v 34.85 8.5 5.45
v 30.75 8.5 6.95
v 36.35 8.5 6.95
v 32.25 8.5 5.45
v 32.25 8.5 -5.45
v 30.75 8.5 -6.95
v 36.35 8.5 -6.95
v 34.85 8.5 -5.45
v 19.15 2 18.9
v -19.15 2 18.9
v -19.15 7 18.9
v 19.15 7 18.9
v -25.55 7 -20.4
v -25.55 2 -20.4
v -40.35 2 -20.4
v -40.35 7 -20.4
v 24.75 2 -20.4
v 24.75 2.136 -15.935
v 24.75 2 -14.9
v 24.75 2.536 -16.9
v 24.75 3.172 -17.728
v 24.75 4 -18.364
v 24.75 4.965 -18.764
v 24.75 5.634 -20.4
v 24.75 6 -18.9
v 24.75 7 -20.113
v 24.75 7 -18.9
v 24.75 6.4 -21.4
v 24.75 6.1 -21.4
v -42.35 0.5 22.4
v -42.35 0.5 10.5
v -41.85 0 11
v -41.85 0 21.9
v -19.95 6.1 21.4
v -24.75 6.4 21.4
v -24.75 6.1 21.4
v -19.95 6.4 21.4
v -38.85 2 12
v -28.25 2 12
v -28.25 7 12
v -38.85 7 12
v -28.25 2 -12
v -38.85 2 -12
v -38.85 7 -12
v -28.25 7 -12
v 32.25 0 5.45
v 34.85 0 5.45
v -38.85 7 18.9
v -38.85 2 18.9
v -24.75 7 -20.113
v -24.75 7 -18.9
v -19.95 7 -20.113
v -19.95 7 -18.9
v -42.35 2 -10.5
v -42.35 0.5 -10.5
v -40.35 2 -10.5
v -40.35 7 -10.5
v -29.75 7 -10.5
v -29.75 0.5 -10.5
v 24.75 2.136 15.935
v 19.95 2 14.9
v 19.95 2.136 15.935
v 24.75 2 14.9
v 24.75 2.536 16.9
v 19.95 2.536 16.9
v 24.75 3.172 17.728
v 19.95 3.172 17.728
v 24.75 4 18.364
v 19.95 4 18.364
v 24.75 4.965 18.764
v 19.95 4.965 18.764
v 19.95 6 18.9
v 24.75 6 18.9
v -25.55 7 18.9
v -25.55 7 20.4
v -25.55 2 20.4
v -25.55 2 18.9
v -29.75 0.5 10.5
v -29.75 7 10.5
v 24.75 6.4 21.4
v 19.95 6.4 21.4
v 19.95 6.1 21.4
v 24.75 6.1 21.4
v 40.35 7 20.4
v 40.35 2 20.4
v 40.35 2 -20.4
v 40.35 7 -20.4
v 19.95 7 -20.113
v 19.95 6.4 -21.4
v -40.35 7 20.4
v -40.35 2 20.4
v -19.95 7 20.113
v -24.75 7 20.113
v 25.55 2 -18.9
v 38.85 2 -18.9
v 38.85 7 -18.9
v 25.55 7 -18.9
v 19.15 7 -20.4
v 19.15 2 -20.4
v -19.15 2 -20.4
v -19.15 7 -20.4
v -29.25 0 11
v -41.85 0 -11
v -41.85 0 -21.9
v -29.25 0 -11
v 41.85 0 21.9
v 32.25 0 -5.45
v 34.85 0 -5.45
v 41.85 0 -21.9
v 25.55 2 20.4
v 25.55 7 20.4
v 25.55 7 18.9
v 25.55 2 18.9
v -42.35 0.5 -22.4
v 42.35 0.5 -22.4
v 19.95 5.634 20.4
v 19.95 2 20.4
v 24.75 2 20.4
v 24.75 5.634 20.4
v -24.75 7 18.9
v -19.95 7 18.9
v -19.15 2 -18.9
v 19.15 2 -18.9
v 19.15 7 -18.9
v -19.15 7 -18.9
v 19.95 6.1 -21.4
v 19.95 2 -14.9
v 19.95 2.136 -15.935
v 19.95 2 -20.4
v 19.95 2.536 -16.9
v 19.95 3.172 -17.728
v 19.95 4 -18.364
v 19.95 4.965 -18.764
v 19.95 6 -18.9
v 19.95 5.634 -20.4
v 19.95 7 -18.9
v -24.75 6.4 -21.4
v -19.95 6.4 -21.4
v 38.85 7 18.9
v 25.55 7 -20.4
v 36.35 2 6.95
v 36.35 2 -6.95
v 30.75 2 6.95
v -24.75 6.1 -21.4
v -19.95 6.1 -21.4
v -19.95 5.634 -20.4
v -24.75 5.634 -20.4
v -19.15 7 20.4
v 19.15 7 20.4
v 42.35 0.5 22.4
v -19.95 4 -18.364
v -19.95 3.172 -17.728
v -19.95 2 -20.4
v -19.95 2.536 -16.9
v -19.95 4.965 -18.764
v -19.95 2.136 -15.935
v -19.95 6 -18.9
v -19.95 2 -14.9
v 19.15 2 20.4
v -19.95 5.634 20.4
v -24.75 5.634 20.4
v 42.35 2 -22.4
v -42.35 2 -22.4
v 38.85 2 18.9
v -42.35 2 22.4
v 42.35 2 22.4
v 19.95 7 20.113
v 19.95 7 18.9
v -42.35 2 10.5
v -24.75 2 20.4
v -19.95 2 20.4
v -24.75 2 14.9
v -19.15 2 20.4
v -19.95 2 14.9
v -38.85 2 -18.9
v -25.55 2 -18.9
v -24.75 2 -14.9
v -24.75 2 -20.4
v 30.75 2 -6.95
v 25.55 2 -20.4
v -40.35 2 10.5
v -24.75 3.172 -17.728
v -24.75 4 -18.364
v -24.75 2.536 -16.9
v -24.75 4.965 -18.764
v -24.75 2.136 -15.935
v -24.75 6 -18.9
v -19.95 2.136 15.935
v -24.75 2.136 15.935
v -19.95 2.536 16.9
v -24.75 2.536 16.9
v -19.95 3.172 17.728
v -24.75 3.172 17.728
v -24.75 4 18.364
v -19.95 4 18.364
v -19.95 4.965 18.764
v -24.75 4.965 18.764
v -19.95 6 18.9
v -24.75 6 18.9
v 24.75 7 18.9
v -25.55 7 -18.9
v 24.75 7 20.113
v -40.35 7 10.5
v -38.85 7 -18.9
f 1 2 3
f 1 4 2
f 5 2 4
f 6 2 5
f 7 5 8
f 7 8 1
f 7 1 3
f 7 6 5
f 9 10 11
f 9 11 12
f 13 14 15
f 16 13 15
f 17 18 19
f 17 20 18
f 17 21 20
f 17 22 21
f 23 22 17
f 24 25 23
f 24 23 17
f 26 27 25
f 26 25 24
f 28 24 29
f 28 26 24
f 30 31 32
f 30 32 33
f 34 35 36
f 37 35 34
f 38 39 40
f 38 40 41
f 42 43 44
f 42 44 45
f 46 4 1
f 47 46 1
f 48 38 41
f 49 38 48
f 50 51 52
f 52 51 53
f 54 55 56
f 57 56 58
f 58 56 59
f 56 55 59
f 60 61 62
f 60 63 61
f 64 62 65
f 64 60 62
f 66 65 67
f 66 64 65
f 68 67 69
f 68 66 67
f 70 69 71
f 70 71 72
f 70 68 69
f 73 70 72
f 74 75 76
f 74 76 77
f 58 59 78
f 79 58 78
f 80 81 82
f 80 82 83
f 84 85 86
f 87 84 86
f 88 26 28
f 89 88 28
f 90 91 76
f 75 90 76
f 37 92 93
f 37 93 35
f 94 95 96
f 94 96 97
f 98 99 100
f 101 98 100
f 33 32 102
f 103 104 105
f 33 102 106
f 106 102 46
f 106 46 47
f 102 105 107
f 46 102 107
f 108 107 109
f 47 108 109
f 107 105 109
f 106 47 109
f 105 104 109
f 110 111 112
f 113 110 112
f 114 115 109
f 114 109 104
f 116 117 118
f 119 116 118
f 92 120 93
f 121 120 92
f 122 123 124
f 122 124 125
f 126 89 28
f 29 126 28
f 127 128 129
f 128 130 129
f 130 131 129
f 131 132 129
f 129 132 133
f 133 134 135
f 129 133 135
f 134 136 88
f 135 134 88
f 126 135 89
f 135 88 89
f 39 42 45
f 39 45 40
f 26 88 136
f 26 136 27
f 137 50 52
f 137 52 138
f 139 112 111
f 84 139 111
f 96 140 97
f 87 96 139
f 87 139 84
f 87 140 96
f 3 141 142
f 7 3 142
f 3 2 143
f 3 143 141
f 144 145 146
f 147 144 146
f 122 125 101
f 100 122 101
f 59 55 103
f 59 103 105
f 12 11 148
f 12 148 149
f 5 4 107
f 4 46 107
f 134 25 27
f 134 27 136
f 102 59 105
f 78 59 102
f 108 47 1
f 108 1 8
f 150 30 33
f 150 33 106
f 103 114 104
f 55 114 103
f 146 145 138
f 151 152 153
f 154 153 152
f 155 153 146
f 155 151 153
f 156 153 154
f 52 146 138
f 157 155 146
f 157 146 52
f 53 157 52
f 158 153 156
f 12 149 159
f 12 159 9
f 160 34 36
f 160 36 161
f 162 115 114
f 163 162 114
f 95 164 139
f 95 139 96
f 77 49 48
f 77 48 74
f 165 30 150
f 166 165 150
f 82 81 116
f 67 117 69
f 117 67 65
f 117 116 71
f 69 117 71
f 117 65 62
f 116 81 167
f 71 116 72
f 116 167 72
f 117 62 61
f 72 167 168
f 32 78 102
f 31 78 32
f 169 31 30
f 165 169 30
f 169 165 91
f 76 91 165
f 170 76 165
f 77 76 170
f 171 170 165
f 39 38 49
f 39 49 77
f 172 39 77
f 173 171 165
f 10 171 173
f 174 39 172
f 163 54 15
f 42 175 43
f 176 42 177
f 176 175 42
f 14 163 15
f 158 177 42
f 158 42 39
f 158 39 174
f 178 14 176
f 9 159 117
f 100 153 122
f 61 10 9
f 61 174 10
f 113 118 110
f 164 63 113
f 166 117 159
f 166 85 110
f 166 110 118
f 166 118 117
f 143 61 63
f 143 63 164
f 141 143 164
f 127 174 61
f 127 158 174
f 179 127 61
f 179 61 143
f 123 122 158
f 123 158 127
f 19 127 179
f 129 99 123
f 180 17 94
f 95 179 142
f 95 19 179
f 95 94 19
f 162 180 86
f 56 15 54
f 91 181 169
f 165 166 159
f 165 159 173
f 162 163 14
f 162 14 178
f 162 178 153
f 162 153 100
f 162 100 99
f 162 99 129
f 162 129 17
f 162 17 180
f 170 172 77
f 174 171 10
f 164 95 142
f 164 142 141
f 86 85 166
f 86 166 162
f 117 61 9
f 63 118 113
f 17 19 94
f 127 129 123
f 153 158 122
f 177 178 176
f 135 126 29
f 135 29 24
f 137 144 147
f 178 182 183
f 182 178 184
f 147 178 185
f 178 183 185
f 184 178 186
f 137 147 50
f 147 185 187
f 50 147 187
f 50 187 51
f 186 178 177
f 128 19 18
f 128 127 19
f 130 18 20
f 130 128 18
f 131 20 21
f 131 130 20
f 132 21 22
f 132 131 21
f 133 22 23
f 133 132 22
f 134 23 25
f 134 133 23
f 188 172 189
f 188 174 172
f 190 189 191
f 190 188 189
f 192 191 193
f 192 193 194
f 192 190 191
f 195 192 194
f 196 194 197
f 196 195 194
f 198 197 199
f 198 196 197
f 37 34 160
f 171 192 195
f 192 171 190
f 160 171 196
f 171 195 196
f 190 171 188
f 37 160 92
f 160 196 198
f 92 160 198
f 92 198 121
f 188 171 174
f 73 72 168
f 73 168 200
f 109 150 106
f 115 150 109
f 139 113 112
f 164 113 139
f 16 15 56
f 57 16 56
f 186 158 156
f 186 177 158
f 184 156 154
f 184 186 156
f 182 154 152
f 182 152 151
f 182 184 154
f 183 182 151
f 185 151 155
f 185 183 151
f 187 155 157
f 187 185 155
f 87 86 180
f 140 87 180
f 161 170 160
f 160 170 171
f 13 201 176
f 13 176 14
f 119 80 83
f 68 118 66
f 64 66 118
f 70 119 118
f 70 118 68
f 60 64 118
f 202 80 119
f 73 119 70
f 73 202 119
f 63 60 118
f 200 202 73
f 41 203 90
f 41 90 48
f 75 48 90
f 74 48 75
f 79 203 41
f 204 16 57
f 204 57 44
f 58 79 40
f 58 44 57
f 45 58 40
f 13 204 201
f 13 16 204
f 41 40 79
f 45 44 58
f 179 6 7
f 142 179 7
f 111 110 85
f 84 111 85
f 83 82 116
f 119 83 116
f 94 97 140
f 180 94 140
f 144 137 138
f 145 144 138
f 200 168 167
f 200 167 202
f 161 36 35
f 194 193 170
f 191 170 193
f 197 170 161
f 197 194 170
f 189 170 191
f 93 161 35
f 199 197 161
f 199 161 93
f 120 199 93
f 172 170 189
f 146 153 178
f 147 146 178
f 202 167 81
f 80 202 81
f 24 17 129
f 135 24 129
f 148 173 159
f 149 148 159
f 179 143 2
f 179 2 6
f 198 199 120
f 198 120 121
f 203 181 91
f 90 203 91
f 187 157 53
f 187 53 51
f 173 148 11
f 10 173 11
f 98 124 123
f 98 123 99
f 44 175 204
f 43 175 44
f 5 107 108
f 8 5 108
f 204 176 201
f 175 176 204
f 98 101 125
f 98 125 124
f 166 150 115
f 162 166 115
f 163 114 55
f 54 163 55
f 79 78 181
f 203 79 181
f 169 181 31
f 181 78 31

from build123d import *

# Parameters (mm, degrees)
BOSS_EXTRUDE1_DEPTH = 2
BOSS_EXTRUDE2_DEPTH = 5
SKETCH3_W           = 0.8
SKETCH3_H           = 1.5
CUT_EXTRUDE1_DEPTH  = 5
SKETCH4_W           = 4.8
SKETCH4_H           = 1.5
BOSS_EXTRUDE3_DEPTH = 1
CHAMFER3_SIZE       = 0.6
CHAMFER3_SIZE_2     = 1.286704152
SKETCH6_W           = 2.6
SKETCH6_H           = 10.9
CUT_EXTRUDE2_DEPTH  = 49.169310769
SKETCH7_W           = 5.6
SKETCH7_H           = 13.9
SKETCH7_W_2         = 2.6
SKETCH7_H_2         = 10.9
BOSS_EXTRUDE4_DEPTH = 6.5
CHAMFER6_SIZE       = 0.5
FILLET1_R           = 4


with BuildPart() as part:
    # Sketch1 → Boss-Extrude1 (new body)
    with BuildSketch(Plane(origin=(0, 0, 0), x_dir=(1, 0, 0), z_dir=(0, 1, 0))):
        Polygon((-42.35, 10.5), (-29.75, 10.5), (-29.75, -10.5), (-42.35, -10.5), (-42.35, -22.4), (42.35, -22.4), (42.35, 22.4), (-42.35, 22.4), align=None)
    extrude(amount=BOSS_EXTRUDE1_DEPTH)

    # Sketch2 → Boss-Extrude2 (add)
    with BuildSketch(Plane(origin=(0, 2, 0), x_dir=(1, 0, 0), z_dir=(0, 1, 0))):
        Polygon((-40.35, 20.4), (-40.35, 10.5), (-29.75, 10.5), (-29.75, -10.5), (-40.35, -10.5), (-40.35, -20.4), (40.35, -20.4), (40.35, 20.4), align=None)
        Polygon((-38.85, -12), (-38.85, -18.9), (38.85, -18.9), (38.85, 18.9), (-38.85, 18.9), (-38.85, 12), (-28.25, 12), (-28.25, -12), align=None, mode=Mode.SUBTRACT)
    extrude(amount=BOSS_EXTRUDE2_DEPTH)

    # Sketch3 → Cut-Extrude1 (cut)
    with BuildSketch(Plane(origin=(0, 7, 0), x_dir=(1, 0, 0), z_dir=(0, 1, 0))):
        with Locations((-25.15, 19.65)):
            Rectangle(SKETCH3_W, SKETCH3_H)
        with Locations((-19.55, 19.65)):
            Rectangle(SKETCH3_W, SKETCH3_H)
        with Locations((-19.55, -19.65)):
            Rectangle(SKETCH3_W, SKETCH3_H)
        with Locations((-25.15, -19.65)):
            Rectangle(SKETCH3_W, SKETCH3_H)
        with Locations((19.55, 19.65)):
            Rectangle(SKETCH3_W, SKETCH3_H)
        with Locations((25.15, 19.65)):
            Rectangle(SKETCH3_W, SKETCH3_H)
        with Locations((25.15, -19.65)):
            Rectangle(SKETCH3_W, SKETCH3_H)
        with Locations((19.55, -19.65)):
            Rectangle(SKETCH3_W, SKETCH3_H)
    extrude(amount=-CUT_EXTRUDE1_DEPTH, mode=Mode.SUBTRACT)

    # Sketch4 → Boss-Extrude3 (add)
    with BuildSketch(Plane.XY.offset(20.4)):
        with Locations((-22.35, 6.25)):
            Rectangle(SKETCH4_W, SKETCH4_H)
        with Locations((22.35, 6.25)):
            Rectangle(SKETCH4_W, SKETCH4_H)
    boss_extrude3 = extrude(amount=BOSS_EXTRUDE3_DEPTH)

    # Mirror1: Boss-Extrude3 across plane
    add(boss_extrude3.mirror(Plane.XY))

    # Chamfer3
    # the kernel refuses this chamfer: 1.286704152, 0.6 mm, written as the material it takes off along each edge
    with BuildSketch(Plane(origin=(16.616181102, 5.5, -21.4), x_dir=(0, 0.9971975577536771, -0.07481330637060246), z_dir=(1, 0, 0))) as chamfer3_piece_1_section:
        Polygon((CHAMFER3_SIZE * 0.997197557754, CHAMFER3_SIZE * 0.0748133063706), (-CHAMFER3_SIZE_2 * 0.0748133063884, CHAMFER3_SIZE_2 * 0.997197557991), (0, 0), align=None)
    chamfer3_piece_1 = extrude(amount=11.467637795, mode=Mode.PRIVATE)
    chamfer3_piece_1 = split(chamfer3_piece_1, bisect_by=Plane(origin=(22.35, 5.708120407, -20.4), z_dir=(0, 0, -1)), keep=Keep.TOP, mode=Mode.PRIVATE)
    add(chamfer3_piece_1, mode=Mode.SUBTRACT)
    with BuildSketch(Plane(origin=(28.083818898, 7, -21.4), x_dir=(0, 0.016311164131109942, 0.9998669641130704), z_dir=(-1, 0, 0))) as chamfer3_piece_2_section:
        Polygon((CHAMFER3_SIZE_2 * 0.999866964351, -CHAMFER3_SIZE_2 * 0.016311164135), (-CHAMFER3_SIZE * 0.0163111641311, -CHAMFER3_SIZE * 0.999866964113), (0, 0), align=None)
    chamfer3_piece_2 = extrude(amount=8.133818898, mode=Mode.PRIVATE)
    chamfer3_piece_2 = split(chamfer3_piece_2, bisect_by=Plane(origin=(25.55, 6.955435886, -20.304431949), z_dir=(-1, 0, 0)), keep=Keep.TOP, mode=Mode.PRIVATE)
    add(chamfer3_piece_2, mode=Mode.SUBTRACT)
    with BuildSketch(Plane(origin=(-16.616181102, 5.5, -21.4), x_dir=(0, 0.9971975577536771, -0.07481330637060246), z_dir=(-1, 0, 0))) as chamfer3_piece_3_section:
        Polygon((CHAMFER3_SIZE * 0.997197557754, -CHAMFER3_SIZE * 0.0748133063706), (-CHAMFER3_SIZE_2 * 0.0748133063884, -CHAMFER3_SIZE_2 * 0.997197557991), (0, 0), align=None)
    chamfer3_piece_3 = extrude(amount=11.467637795, mode=Mode.PRIVATE)
    chamfer3_piece_3 = split(chamfer3_piece_3, bisect_by=Plane(origin=(-22.35, 5.708120407, -20.4), z_dir=(0, 0, -1)), keep=Keep.TOP, mode=Mode.PRIVATE)
    add(chamfer3_piece_3, mode=Mode.SUBTRACT)
    with BuildSketch(Plane(origin=(-24.75, 7, -21.4), x_dir=(0, 0.016311164131109942, 0.9998669641130704), z_dir=(1, 0, 0))) as chamfer3_piece_4_section:
        Polygon((CHAMFER3_SIZE_2 * 0.999866964351, CHAMFER3_SIZE_2 * 0.016311164135), (-CHAMFER3_SIZE * 0.0163111641311, CHAMFER3_SIZE * 0.999866964113), (0, 0), align=None)
    chamfer3_piece_4 = extrude(amount=8.133818898, mode=Mode.PRIVATE)
    chamfer3_piece_4 = split(chamfer3_piece_4, bisect_by=Plane(origin=(-19.15, 6.955435886, -20.304431949), z_dir=(-1, 0, 0)), keep=Keep.TOP, mode=Mode.PRIVATE)
    add(chamfer3_piece_4, mode=Mode.SUBTRACT)
    with BuildSketch(Plane(origin=(16.616181102, 5.5, 21.4), x_dir=(0, 0.9971975577536771, 0.07481330637060246), z_dir=(1, 0, 0))) as chamfer3_piece_5_section:
        Polygon((CHAMFER3_SIZE * 0.997197557754, -CHAMFER3_SIZE * 0.0748133063706), (-CHAMFER3_SIZE_2 * 0.0748133063884, -CHAMFER3_SIZE_2 * 0.997197557991), (0, 0), align=None)
    chamfer3_piece_5 = extrude(amount=11.467637795, mode=Mode.PRIVATE)
    chamfer3_piece_5 = split(chamfer3_piece_5, bisect_by=Plane(origin=(22.35, 5.708120407, 20.4), z_dir=(0, 0, 1)), keep=Keep.TOP, mode=Mode.PRIVATE)
    add(chamfer3_piece_5, mode=Mode.SUBTRACT)
    with BuildSketch(Plane(origin=(24.75, 7, 21.4), x_dir=(0, 0.016311164131109942, -0.9998669641130704), z_dir=(-1, 0, 0))) as chamfer3_piece_6_section:
        Polygon((CHAMFER3_SIZE_2 * 0.999866964351, CHAMFER3_SIZE_2 * 0.016311164135), (-CHAMFER3_SIZE * 0.0163111641311, CHAMFER3_SIZE * 0.999866964113), (0, 0), align=None)
    chamfer3_piece_6 = extrude(amount=8.133818898, mode=Mode.PRIVATE)
    chamfer3_piece_6 = split(chamfer3_piece_6, bisect_by=Plane(origin=(19.15, 6.955435886, 20.304431949), z_dir=(1, 0, 0)), keep=Keep.TOP, mode=Mode.PRIVATE)
    add(chamfer3_piece_6, mode=Mode.SUBTRACT)
    with BuildSketch(Plane(origin=(-24.75, 7, 21.4), x_dir=(0, 0.016311164131109942, -0.9998669641130704), z_dir=(1, 0, 0))) as chamfer3_piece_7:
        Polygon((CHAMFER3_SIZE_2 * 0.999866964351, -CHAMFER3_SIZE_2 * 0.016311164135), (-CHAMFER3_SIZE * 0.0163111641311, -CHAMFER3_SIZE * 0.999866964113), (0, 0), align=None)
    extrude(amount=4.8, mode=Mode.SUBTRACT)
    with BuildSketch(Plane(origin=(-16.616181102, 5.5, 21.4), x_dir=(0, 0.9971975577536771, 0.07481330637060246), z_dir=(-1, 0, 0))) as chamfer3_piece_8_section:
        Polygon((CHAMFER3_SIZE * 0.997197557754, CHAMFER3_SIZE * 0.0748133063706), (-CHAMFER3_SIZE_2 * 0.0748133063884, CHAMFER3_SIZE_2 * 0.997197557991), (0, 0), align=None)
    chamfer3_piece_8 = extrude(amount=11.467637795, mode=Mode.PRIVATE)
    chamfer3_piece_8 = split(chamfer3_piece_8, bisect_by=Plane(origin=(-22.35, 5.708120407, 20.4), z_dir=(0, 0, 1)), keep=Keep.TOP, mode=Mode.PRIVATE)
    add(chamfer3_piece_8, mode=Mode.SUBTRACT)

    # Sketch6 → Cut-Extrude2 (cut, through all)
    with BuildSketch(Plane(origin=(0, 2, 0), x_dir=(1, 0, 0), z_dir=(0, 1, 0))):
        with Locations((33.55, 0)):
            Rectangle(SKETCH6_W, SKETCH6_H)
    extrude(amount=-CUT_EXTRUDE2_DEPTH, mode=Mode.SUBTRACT)

    # Sketch7 → Boss-Extrude4 (add)
    with BuildSketch(Plane(origin=(0, 2, 0), x_dir=(1, 0, 0), z_dir=(0, 1, 0))):
        with Locations((33.55, 0)):
            Rectangle(SKETCH7_W, SKETCH7_H)
        with Locations((33.55, 0)):
            Rectangle(SKETCH7_W_2, SKETCH7_H_2, mode=Mode.SUBTRACT)
    extrude(amount=BOSS_EXTRUDE4_DEPTH)

    # Chamfer6
    chamfer6_edges = [part.edges().sort_by_distance(p)[0] for p in [
        (-36.05, 0, -10.5),
        (-42.35, 0, -16.45),
        (0, 0, -22.4),
        (42.35, 0, 0),
        (0, 0, 22.4),
        (-42.35, 0, 16.45),
        (-36.05, 0, 10.5),
        (-29.75, 0, 0),
    ]]
    chamfer(chamfer6_edges, length=CHAMFER6_SIZE)

    # Fillet1
    fillet1_edges = [part.edges().sort_by_distance(p)[0] for p in [
        (-22.35, 2, 18.9),
        (22.35, 2, 18.9),
        (22.35, 2, -18.9),
        (-22.35, 2, -18.9),
    ]]
    fillet(fillet1_edges, radius=FILLET1_R)


solid = part.part
